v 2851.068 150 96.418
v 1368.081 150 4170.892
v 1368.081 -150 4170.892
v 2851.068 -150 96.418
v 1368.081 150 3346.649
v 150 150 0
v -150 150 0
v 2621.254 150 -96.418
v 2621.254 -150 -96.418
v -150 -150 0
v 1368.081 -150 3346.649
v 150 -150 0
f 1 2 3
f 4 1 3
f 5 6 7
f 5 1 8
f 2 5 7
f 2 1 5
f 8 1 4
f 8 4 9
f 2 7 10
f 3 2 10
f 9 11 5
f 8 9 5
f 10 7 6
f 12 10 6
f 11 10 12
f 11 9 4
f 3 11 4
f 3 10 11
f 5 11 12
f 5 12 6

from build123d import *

# Parameters (mm, degrees)
F0_W = 300
F0_H = 300


with BuildPart() as f2:
    # F2: sweep along a path in F1
    with BuildLine(Plane.XZ) as f2_path:
        Line((0, 0), (1368.0805733027, 3758.7704831436))
        Line((1368.0805733027, 3758.7704831436), (2736.1611466053, 0))
    # F0 (on Top) → F2 (sweep)
    with BuildSketch(Plane.XY):
        Rectangle(F0_W, F0_H)
    sweep(path=f2_path.line, transition=Transition.RIGHT)


solid = f2.part
